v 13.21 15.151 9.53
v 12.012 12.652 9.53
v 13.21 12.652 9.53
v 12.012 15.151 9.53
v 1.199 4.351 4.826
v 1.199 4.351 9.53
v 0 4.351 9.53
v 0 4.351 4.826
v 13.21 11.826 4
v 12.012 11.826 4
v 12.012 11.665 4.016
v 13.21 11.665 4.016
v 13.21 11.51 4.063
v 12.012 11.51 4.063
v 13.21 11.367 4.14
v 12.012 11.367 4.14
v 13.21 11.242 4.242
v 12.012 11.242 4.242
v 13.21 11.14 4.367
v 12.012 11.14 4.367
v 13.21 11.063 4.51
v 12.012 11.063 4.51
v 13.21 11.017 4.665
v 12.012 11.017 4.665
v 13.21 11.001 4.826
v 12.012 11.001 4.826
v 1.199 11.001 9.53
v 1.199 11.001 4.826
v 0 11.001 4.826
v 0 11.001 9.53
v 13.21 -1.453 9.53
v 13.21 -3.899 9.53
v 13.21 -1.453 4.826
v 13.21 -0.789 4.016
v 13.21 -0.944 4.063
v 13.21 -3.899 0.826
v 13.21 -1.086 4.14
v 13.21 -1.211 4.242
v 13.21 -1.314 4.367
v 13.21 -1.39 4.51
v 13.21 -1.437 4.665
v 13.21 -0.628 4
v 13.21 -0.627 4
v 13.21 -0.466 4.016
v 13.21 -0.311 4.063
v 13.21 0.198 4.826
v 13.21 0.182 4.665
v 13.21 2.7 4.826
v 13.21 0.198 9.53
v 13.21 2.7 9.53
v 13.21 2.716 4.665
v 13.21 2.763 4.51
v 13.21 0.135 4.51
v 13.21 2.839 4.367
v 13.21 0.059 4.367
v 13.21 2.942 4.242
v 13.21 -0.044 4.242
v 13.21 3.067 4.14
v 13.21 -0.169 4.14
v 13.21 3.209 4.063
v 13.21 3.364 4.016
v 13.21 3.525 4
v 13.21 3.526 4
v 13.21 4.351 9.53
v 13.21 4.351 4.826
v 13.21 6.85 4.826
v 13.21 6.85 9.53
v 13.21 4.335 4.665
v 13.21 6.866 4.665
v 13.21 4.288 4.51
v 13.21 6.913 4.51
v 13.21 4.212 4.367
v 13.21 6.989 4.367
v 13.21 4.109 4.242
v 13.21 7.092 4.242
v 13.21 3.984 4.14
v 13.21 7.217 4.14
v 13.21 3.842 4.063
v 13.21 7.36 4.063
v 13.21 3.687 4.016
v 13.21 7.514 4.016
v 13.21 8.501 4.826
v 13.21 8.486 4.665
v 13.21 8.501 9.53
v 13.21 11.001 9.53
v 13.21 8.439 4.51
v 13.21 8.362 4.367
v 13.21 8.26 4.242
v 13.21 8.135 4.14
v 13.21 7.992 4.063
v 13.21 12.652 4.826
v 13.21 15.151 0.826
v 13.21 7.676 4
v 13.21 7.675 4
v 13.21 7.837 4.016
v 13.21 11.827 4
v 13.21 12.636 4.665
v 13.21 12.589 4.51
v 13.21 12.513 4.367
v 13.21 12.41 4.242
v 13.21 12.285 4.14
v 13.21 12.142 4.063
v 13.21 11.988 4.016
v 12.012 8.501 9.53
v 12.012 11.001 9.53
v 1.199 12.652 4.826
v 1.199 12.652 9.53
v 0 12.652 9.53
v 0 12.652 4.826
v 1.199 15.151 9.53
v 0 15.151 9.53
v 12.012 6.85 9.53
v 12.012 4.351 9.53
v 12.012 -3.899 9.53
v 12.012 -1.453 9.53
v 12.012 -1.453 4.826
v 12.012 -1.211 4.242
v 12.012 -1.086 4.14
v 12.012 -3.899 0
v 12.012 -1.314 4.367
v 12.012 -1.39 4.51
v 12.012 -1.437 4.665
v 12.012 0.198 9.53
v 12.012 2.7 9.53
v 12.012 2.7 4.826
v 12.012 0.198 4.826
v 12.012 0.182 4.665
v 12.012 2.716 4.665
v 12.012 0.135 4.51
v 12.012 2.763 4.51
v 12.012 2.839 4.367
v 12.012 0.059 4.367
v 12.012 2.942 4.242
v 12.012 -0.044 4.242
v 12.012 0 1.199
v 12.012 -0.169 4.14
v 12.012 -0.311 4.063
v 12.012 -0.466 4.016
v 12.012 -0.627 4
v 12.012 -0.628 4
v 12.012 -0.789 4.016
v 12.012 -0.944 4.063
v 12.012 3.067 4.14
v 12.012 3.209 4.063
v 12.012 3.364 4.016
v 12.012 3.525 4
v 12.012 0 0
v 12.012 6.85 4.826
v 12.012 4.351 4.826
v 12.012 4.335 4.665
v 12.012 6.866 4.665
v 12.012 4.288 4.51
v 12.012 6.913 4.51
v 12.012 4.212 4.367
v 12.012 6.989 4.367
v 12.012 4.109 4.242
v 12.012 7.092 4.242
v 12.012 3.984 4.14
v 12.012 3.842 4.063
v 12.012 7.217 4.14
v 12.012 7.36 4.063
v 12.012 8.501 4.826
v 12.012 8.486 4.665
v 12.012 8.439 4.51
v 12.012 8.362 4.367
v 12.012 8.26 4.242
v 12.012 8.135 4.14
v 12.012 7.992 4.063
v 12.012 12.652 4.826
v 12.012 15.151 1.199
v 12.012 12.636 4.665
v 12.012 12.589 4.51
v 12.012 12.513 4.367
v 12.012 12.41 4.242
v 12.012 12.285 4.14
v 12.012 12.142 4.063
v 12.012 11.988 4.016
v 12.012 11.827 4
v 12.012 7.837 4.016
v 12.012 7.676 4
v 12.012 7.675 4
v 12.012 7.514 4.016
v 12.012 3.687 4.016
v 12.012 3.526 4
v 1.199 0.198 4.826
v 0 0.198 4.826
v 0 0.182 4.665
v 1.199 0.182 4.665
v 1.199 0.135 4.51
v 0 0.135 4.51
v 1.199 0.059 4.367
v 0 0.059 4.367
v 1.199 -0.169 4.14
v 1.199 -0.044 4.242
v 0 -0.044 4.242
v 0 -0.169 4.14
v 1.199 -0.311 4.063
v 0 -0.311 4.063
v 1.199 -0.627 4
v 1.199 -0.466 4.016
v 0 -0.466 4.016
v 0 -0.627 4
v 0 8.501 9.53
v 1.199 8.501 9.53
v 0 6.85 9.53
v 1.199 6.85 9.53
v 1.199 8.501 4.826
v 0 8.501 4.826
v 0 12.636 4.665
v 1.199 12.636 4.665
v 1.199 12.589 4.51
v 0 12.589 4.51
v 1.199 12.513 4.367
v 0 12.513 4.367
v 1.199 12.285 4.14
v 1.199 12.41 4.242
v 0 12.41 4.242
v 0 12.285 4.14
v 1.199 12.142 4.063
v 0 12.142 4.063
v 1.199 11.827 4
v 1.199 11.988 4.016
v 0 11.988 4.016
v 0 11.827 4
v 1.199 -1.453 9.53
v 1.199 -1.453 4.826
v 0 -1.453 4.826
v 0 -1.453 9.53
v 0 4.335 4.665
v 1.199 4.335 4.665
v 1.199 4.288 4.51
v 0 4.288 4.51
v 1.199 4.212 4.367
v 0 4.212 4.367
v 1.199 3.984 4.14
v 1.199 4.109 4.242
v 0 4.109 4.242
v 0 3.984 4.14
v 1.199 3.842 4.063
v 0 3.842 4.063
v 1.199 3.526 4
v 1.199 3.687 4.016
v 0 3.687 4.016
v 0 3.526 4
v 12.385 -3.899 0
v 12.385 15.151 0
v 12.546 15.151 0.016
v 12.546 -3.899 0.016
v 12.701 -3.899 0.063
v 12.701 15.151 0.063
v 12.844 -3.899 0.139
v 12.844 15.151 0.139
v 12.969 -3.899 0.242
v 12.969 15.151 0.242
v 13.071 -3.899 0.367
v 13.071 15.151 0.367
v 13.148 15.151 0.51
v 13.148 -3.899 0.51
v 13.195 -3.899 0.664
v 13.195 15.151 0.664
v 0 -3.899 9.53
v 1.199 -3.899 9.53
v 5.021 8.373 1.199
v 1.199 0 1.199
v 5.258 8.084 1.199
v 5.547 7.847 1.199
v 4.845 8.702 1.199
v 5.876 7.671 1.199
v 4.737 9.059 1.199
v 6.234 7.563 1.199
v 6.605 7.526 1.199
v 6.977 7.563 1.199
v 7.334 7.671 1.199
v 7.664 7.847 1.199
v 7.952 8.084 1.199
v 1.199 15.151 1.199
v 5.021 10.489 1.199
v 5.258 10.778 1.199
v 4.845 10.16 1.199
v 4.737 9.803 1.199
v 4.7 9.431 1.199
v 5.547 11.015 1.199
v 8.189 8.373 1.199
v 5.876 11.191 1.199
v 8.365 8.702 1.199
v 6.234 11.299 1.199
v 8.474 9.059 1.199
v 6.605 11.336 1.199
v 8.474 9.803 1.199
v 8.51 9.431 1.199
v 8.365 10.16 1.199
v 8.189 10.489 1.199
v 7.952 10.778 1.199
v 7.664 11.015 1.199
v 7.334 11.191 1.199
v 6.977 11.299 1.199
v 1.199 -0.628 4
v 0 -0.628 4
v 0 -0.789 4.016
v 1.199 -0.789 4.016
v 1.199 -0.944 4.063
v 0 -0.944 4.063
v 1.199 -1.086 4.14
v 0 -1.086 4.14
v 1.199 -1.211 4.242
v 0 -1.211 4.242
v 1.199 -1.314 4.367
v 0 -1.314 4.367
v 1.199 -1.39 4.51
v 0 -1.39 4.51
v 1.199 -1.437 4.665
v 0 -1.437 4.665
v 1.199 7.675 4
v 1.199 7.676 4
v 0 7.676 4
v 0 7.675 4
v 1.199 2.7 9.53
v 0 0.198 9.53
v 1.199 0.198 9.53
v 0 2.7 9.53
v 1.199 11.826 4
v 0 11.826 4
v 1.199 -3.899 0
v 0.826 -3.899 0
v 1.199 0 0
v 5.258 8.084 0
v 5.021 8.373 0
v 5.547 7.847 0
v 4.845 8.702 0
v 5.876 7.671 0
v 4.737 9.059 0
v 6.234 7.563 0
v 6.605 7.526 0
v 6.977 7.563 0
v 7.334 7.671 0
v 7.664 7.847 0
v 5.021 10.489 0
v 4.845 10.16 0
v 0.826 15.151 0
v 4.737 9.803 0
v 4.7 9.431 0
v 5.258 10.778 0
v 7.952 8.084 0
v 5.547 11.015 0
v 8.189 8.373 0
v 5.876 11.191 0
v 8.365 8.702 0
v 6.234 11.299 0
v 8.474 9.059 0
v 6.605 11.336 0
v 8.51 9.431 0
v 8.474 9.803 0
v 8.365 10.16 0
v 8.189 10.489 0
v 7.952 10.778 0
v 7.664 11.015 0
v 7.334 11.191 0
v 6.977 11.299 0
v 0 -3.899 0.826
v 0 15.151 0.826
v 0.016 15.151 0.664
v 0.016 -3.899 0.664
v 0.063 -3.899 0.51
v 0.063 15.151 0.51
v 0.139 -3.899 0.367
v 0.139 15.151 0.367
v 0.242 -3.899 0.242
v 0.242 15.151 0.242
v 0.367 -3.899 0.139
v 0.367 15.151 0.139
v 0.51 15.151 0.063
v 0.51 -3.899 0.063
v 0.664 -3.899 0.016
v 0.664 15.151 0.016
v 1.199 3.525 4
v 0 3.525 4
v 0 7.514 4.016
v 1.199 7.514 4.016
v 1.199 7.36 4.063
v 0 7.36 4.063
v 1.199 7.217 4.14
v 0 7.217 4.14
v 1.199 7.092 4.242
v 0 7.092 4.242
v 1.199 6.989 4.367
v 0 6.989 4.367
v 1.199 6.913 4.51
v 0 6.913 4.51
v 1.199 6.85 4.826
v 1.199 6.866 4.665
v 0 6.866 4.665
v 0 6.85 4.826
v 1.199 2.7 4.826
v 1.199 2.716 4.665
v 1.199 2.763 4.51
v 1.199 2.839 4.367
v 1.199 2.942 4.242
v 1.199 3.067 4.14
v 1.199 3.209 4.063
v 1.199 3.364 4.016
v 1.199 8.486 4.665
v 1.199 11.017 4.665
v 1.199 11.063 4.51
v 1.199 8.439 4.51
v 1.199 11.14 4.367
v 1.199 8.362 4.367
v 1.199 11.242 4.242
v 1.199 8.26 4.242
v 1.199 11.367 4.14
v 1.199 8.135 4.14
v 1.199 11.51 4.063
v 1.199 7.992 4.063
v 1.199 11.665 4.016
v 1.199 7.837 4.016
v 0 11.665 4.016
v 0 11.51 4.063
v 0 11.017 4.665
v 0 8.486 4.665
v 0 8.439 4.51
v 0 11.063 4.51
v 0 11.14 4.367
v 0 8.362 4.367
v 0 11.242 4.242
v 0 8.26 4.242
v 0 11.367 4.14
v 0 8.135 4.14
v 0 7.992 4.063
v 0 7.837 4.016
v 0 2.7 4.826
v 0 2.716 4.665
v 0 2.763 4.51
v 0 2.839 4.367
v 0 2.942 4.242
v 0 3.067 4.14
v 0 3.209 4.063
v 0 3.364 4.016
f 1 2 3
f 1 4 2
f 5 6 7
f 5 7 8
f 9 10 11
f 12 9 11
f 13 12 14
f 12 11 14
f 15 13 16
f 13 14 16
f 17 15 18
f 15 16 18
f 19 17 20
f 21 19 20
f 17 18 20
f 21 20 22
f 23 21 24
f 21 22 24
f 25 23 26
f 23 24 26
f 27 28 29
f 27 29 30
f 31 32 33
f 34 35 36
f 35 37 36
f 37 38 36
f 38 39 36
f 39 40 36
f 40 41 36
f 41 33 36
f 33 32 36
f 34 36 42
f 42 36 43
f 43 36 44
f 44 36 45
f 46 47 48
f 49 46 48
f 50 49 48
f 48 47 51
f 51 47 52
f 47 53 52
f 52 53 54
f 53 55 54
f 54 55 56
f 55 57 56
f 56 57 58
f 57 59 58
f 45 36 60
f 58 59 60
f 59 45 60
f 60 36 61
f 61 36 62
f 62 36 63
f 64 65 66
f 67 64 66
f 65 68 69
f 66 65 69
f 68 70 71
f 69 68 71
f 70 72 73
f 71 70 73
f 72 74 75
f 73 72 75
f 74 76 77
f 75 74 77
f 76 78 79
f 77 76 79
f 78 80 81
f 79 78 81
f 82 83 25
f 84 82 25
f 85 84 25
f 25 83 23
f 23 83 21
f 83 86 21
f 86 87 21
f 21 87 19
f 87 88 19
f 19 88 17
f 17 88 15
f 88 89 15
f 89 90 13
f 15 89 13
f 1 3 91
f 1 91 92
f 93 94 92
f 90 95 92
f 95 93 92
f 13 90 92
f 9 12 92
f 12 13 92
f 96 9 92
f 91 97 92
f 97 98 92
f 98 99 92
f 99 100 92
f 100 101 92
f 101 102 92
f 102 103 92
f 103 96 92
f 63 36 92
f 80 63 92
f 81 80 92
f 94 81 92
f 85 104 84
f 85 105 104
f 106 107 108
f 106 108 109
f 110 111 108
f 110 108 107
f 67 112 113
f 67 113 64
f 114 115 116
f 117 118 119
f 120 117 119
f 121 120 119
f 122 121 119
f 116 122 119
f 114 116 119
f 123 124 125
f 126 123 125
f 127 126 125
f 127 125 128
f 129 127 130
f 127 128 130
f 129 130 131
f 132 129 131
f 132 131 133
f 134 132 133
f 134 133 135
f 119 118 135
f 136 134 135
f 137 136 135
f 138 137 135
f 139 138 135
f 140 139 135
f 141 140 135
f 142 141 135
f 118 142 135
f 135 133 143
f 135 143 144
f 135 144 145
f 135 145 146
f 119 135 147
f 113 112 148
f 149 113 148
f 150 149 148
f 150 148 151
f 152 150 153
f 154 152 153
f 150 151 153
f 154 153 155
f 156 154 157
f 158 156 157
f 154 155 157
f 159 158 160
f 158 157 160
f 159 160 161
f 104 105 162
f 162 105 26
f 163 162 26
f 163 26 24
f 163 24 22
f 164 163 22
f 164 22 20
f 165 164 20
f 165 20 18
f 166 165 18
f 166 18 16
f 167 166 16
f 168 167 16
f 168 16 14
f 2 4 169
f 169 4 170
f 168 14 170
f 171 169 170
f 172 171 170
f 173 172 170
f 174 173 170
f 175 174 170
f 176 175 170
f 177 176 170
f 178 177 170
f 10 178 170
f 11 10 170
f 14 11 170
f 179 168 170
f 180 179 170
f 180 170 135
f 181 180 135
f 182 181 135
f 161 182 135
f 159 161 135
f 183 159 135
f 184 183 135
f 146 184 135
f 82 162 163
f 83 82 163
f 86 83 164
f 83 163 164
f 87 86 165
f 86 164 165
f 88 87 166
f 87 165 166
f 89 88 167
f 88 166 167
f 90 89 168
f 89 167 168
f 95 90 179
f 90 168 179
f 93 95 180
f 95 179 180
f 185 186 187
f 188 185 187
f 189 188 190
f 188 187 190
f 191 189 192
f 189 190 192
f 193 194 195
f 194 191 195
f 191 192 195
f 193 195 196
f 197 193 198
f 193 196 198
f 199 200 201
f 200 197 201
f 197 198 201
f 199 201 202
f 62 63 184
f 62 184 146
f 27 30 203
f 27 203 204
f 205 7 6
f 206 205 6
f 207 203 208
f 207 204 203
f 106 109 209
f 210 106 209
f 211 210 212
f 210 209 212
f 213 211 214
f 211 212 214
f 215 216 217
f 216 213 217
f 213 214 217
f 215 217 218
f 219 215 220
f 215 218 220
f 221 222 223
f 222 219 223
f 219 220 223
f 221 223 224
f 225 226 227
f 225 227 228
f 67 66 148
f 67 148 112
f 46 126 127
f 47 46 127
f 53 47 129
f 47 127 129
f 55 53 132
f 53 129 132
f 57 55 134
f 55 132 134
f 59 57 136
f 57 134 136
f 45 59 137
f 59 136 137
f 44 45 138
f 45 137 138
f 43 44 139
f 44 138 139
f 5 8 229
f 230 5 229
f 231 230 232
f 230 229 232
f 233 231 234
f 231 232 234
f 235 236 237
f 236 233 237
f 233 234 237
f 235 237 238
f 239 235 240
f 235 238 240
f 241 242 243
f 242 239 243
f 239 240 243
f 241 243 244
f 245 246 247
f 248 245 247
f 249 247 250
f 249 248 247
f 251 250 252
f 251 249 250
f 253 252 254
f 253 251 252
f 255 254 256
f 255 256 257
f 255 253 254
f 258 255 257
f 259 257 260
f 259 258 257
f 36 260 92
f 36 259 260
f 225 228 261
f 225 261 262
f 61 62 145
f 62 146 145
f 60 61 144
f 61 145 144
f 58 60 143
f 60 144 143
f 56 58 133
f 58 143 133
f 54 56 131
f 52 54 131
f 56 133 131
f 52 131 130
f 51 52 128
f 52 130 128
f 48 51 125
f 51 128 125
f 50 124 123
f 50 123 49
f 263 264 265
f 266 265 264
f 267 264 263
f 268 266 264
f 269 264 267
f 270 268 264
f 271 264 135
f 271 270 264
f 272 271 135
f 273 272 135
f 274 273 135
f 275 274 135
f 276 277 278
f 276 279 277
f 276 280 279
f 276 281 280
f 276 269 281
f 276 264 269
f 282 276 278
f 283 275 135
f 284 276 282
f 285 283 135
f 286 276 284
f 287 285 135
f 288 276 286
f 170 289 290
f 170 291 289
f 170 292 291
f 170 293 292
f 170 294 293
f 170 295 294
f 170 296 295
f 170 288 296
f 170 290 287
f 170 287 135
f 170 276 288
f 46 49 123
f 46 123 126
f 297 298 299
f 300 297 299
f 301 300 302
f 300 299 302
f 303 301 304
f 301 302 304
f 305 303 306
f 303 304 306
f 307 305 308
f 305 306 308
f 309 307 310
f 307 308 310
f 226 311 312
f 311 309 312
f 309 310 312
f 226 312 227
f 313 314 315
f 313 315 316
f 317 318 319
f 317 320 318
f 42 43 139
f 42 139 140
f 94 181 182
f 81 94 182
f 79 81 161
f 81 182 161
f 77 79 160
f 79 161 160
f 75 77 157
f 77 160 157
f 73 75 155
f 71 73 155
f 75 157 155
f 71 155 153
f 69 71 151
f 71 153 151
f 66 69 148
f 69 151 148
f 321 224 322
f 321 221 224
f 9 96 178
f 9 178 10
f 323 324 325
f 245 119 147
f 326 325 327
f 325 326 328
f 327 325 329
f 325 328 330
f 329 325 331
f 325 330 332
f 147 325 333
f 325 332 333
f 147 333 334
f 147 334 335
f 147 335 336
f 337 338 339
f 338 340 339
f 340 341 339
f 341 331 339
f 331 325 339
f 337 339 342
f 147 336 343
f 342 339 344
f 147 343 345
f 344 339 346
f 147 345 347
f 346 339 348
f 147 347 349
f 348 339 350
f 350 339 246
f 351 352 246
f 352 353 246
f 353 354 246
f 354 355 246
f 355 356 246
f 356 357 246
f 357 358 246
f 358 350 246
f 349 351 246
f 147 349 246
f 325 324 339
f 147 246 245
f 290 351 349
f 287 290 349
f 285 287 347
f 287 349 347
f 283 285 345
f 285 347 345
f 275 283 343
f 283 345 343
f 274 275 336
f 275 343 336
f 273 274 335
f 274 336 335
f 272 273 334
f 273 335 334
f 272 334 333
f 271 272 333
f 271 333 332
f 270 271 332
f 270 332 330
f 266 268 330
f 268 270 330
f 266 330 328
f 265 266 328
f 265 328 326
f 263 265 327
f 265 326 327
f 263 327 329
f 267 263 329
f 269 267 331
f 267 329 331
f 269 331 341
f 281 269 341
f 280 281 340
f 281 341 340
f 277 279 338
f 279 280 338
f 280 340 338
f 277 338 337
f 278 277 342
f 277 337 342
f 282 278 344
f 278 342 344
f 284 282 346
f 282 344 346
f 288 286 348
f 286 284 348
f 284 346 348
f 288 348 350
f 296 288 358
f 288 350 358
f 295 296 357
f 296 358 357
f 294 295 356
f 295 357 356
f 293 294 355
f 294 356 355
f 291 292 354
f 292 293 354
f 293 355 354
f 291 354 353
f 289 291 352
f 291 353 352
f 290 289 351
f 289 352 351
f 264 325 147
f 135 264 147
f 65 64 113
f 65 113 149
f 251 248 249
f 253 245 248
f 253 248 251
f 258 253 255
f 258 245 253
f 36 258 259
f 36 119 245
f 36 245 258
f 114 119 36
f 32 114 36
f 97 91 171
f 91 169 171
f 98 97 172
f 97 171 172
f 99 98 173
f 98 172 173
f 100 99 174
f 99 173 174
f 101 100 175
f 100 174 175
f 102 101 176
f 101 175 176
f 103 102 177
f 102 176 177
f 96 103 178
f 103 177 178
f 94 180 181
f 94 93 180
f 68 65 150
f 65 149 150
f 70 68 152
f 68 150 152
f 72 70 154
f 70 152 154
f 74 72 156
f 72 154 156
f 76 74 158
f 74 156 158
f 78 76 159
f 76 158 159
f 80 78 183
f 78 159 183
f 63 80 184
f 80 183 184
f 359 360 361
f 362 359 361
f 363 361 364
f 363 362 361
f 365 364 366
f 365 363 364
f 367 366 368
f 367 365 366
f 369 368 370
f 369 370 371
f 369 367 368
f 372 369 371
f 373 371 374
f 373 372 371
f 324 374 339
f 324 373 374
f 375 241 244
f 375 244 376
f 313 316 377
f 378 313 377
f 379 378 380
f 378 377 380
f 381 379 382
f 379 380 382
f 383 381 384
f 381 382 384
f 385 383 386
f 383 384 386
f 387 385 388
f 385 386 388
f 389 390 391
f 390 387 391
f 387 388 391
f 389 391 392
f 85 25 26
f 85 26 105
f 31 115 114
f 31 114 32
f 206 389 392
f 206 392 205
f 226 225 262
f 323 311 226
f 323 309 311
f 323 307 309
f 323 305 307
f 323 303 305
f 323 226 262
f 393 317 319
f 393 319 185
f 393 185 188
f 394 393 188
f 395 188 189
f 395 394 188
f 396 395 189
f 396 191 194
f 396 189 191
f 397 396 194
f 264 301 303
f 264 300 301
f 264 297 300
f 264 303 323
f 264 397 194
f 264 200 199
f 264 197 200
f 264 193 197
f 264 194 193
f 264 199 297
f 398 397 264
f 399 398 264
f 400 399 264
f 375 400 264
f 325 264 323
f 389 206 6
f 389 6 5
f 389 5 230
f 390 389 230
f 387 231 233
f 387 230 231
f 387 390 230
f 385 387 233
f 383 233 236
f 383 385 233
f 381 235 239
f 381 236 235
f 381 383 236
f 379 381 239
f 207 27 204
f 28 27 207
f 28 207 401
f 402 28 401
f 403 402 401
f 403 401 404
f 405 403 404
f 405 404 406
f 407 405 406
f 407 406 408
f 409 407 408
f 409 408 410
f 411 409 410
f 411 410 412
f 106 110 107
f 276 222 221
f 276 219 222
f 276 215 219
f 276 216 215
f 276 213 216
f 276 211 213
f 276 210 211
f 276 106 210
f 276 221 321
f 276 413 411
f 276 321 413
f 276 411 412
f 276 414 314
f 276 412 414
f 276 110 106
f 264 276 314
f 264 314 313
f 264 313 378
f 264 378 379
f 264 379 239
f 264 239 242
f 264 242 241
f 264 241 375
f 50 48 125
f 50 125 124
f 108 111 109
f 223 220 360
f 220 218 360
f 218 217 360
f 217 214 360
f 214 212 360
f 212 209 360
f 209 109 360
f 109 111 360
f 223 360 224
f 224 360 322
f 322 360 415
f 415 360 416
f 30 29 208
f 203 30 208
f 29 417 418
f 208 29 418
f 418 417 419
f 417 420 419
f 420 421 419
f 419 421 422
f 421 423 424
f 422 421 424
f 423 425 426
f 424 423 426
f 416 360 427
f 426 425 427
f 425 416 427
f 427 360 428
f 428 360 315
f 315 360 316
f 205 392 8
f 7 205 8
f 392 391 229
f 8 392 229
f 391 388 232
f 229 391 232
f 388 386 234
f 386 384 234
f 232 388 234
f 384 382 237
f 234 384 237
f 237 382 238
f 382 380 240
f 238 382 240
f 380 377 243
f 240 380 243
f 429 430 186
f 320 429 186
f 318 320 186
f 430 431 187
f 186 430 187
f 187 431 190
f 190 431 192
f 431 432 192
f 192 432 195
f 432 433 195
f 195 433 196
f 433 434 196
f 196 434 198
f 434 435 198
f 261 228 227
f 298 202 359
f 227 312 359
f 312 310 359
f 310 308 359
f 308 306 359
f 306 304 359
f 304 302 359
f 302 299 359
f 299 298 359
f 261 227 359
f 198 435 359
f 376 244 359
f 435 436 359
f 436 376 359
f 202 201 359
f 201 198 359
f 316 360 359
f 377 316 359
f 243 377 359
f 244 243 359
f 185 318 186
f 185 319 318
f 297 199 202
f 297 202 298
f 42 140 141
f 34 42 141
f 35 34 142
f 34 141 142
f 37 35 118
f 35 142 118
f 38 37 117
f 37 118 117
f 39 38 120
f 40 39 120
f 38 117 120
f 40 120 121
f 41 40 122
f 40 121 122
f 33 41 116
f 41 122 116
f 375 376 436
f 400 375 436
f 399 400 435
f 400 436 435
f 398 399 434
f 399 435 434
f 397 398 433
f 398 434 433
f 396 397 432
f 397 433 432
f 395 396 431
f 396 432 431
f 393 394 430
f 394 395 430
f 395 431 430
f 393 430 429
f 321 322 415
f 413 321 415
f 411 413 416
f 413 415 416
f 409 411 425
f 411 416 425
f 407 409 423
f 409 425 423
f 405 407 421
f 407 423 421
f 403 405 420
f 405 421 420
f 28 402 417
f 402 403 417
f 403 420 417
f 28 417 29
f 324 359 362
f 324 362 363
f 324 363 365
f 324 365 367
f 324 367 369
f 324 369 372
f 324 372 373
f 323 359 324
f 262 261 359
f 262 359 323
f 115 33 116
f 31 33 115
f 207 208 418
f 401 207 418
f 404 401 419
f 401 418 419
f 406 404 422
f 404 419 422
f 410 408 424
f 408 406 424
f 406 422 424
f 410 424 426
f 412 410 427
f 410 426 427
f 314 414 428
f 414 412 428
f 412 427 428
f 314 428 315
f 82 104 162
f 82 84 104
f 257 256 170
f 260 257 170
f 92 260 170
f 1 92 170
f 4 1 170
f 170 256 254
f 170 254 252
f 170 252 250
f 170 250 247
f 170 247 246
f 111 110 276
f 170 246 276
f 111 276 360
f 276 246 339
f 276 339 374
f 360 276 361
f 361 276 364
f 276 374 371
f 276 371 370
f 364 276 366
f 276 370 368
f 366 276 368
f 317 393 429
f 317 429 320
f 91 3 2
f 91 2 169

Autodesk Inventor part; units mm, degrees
ref_plane "YZ Plane" through (0, 0, 0) normal (1, 0, 0) x (0, 1, 0)
ref_plane "XZ Plane" through (0, 0, 0) normal (0, 1, 0) x (-1, 0, 0)
ref_plane "XY Plane" through (0, 0, 0) normal (0, 0, 1) x (1, 0, 0)
sketch "Sketch1" plane through (0, 0, 0) normal (0, 0, 1) x (1, 0, 0)
  line L0 (0, 0) -> (13.2105, 0)
  line L1 (13.2105, 0) -> (13.2105, 15.1511)
  line L2 (13.2105, 15.1511) -> (0, 15.1511)
  line L3 (0, 15.1511) -> (0, 0)
  circle A0 centre (6.6053, 9.431) radius 1.905
  dimension "d0" = 13.2105
  dimension "d1" = 15.1511
  dimension "d2" = 3.81
  dimension "d3" = 5.7201
extrude "Extrusion1" add sketch "Sketch1" along normal blind 1.1989
sketch "Sketch2" plane through (0, 0, 0) normal (0, -1, 0) x (1, 0, 0)
  line L0 (0, 0) -> (13.2105, 0) projected
  line L1 (0, 1.1989) -> (1.1989, 1.1989)
  line L2 (1.1989, 1.1989) -> (1.1989, 0)
  line L3 (1.1989, 0) -> (0, 0)
  line L4 (0, 0) -> (0, 1.1989)
  line L5 (13.2105, 1.1989) -> (12.0117, 1.1989)
  line L6 (12.0117, 1.1989) -> (12.0117, 0)
  line L7 (12.0117, 0) -> (13.2105, 0)
  line L8 (13.2105, 0) -> (13.2105, 1.1989)
  dimension "d6" = 1.1989
  dimension "d7" = 1.1989
extrude "Extrusion2" add sketch "Sketch2" along normal blind 3.8989
sketch "Sketch3" plane through (0, 0, 1.1989) normal (0, 0, 1) x (1, 0, 0)
  line L0 (13.2105, -3.8989) -> (12.0117, -3.8989)
  line L1 (12.0117, -3.8989) -> (12.0117, 15.1511)
  line L2 (12.0117, 15.1511) -> (13.2105, 15.1511)
  line L3 (13.2105, 15.1511) -> (13.2105, -3.8989)
  line L4 (0, -3.8989) -> (1.1989, -3.8989)
  line L5 (1.1989, -3.8989) -> (1.1989, 15.1511)
  line L6 (1.1989, 15.1511) -> (0, 15.1511)
  line L7 (0, 15.1511) -> (0, -3.8989)
  point P0 (0, 0)
extrude "Extrusion3" add sketch "Sketch3" along normal blind 8.3312
sketch "Sketch4" plane through (13.2105, -3.8989, 0) normal (1, 0, 0) x (0, 0, -1)
  line L0 (-9.5301, 19.05) -> (-9.5301, 0) projected
  line L1 (0, 19.05) -> (-9.5301, 19.05) projected
  line L2 (0, 19.05) -> (0, 0) projected
  line L3 (-9.5301, 16.5506) -> (-4.0005, 16.5506)
  line L4 (-4.0005, 16.5506) -> (-4.0005, 14.8996)
  line L5 (-4.0005, 14.8996) -> (-9.5301, 14.8996)
  line L6 (-9.5301, 14.8996) -> (-9.5301, 16.5506)
  line L7 (-9.5301, 12.4003) -> (-4.0005, 12.4003)
  line L8 (-4.0005, 12.4003) -> (-4.0005, 10.7493)
  line L9 (-4.0005, 10.7493) -> (-9.5301, 10.7493)
  line L10 (-9.5301, 10.7493) -> (-9.5301, 12.4003)
  line L11 (-9.5301, 8.2499) -> (-4.0005, 8.2499)
  line L12 (-4.0005, 8.2499) -> (-4.0005, 6.5989)
  line L13 (-4.0005, 6.5989) -> (-9.5301, 6.5989)
  line L14 (-9.5301, 6.5989) -> (-9.5301, 8.2499)
  line L15 (-9.5301, 4.097) -> (-4.0005, 4.097)
  line L16 (-4.0005, 4.097) -> (-4.0005, 2.446)
  line L17 (-4.0005, 2.446) -> (-9.5301, 2.446)
  line L18 (-9.5301, 2.446) -> (-9.5301, 4.097)
  point P0 (0, 3.8989)
  point P1 (-9.5301, 2.446)
  point P2 (-4.0005, 19.05)
  dimension "d12" = 2.4994
  dimension "d13" = 1.651
  dimension "d14" = 2.4994
  dimension "d15" = 1.651
  dimension "d16" = 2.4994
  dimension "d17" = 1.651
  dimension "d18" = 2.5019
  dimension "d19" = 1.651
  dimension "d20" = 4.0005
extrude "Extrusion4" cut sketch "Sketch4" against normal blind 25.4
fillet "Fillet1" radius 0.8255 16 edges at (12.6111, 11.0007, 4.0005) (12.6111, 6.8504, 4.0005) (12.6111, 2.7, 4.0005) (0.5994, -1.4529, 4.0005) (12.6111, -1.4529, 4.0005) (0.5994, 11.0007, 4.0005) (0.5994, 6.8504, 4.0005) (0.5994, 2.7, 4.0005) (12.6111, 12.6517, 4.0005) (12.6111, 8.5014, 4.0005) (12.6111, 4.351, 4.0005) (12.6111, 0.1981, 4.0005) (0.5994, 12.6517, 4.0005) (0.5994, 8.5014, 4.0005) (0.5994, 4.351, 4.0005) (0.5994, 0.1981, 4.0005)
fillet "Fillet2" radius 0.8255 2 edges at (13.2105, 5.6261, 0) (0, 5.6261, 0)
properties part number "TO-220 Heatsink"
